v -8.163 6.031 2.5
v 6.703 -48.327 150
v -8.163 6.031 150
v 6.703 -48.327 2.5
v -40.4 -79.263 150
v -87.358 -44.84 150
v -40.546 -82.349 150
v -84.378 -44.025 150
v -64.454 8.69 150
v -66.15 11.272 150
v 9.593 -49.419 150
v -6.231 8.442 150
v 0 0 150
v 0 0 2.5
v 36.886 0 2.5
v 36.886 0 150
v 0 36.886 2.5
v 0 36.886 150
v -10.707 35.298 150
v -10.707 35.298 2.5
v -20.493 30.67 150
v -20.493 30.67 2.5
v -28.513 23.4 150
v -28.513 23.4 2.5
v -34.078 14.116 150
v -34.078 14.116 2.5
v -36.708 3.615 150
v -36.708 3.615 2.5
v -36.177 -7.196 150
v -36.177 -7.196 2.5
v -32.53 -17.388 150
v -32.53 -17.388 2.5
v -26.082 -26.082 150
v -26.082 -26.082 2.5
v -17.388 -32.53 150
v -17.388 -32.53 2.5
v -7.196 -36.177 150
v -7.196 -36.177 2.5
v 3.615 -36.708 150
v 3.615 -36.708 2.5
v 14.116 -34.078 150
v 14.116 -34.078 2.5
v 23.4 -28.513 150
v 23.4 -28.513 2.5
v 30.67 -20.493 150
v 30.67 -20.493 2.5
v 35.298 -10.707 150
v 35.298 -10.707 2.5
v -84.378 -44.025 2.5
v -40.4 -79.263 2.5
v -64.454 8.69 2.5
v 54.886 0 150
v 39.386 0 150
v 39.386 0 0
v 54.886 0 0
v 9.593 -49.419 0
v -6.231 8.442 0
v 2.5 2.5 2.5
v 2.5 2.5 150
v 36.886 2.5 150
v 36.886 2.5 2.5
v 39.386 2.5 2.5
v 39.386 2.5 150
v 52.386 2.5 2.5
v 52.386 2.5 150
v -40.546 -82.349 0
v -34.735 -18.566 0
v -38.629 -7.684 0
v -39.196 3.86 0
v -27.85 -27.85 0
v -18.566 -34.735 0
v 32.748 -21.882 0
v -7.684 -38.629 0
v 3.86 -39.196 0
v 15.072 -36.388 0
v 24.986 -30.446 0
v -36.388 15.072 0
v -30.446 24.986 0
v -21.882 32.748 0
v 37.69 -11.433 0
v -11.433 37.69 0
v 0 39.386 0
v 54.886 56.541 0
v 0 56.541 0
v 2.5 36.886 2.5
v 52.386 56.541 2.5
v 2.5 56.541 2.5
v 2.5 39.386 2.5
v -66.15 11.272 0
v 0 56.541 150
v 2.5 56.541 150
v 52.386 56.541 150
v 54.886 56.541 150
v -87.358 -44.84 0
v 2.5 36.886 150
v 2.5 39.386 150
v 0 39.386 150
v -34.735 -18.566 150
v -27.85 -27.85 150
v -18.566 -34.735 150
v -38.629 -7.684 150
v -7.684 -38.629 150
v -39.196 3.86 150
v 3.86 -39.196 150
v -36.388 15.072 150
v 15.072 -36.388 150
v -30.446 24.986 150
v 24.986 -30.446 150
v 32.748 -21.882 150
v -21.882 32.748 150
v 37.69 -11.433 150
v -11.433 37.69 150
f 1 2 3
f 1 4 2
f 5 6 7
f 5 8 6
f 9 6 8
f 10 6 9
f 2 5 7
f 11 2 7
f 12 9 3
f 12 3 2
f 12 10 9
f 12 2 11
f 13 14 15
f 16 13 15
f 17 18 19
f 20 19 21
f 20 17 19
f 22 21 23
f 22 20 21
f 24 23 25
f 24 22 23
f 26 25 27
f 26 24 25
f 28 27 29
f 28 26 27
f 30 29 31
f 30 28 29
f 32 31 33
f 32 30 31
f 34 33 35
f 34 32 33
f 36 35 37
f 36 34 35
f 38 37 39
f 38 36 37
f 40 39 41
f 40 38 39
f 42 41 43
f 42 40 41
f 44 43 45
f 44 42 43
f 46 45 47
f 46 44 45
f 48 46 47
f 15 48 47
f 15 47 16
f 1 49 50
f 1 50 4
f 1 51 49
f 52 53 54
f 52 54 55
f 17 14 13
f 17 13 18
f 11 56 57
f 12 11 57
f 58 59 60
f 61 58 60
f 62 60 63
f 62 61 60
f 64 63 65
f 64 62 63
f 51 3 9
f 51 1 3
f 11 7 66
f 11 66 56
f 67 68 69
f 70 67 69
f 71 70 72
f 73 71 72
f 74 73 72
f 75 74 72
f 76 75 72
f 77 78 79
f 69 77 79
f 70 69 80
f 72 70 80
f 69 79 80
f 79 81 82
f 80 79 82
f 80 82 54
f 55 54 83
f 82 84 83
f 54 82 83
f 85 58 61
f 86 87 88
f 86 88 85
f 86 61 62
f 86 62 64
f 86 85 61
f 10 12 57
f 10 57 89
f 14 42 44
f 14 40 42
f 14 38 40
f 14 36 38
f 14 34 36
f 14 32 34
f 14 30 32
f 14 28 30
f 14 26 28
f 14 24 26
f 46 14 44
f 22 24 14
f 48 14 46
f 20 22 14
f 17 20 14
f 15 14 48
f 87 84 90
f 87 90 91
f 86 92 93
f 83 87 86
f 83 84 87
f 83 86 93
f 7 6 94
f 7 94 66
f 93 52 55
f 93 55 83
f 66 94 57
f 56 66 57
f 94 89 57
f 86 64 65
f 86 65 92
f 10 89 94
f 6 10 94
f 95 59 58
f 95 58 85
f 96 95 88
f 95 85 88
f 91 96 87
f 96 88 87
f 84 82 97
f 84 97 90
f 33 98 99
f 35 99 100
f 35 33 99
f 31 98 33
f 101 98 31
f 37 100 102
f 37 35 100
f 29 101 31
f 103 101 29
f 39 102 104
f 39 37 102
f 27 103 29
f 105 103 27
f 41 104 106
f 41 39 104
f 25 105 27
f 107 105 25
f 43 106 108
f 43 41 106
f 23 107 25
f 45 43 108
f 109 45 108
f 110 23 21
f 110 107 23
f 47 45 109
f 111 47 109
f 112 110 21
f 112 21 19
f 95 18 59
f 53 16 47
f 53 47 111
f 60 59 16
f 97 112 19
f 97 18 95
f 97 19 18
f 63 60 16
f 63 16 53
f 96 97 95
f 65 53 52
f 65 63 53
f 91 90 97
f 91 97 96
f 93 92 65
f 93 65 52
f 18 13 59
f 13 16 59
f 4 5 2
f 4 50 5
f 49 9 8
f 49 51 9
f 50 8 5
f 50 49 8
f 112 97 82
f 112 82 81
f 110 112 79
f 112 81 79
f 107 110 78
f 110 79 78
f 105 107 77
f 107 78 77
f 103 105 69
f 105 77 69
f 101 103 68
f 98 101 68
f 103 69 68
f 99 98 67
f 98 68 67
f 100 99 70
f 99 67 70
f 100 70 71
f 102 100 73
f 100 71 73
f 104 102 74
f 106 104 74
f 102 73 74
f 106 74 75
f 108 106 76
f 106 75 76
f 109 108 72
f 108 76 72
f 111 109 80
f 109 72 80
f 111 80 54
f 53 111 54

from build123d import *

# Parameters (mm, degrees)
F0_R         = 39.3858974646
F1_DEPTH     = 150
F2_T         = -2.5
F3_W         = 54.8863634467
F3_H         = 56.5410479903
F4_DEPTH     = 150
F5_T         = 2.5
F5_T3_DEPTH  = 155
F5_T5_DEPTH  = 152.5
F5_T7_DEPTH  = 41.8858974646
F5_T9_DEPTH  = 41.8858974646
F5_T12_ANGLE = 270.000000001
F7_DEPTH     = 150
F8_T         = -2.5


# Not quite as in the source:
# - a shell that OpenCascade refuses in one call is made with other operations: the cavity is built on its own and cut out


with BuildPart() as f1:
    # F0 (on Top) → F1 (new body)
    with BuildSketch(Plane.XY):
        Circle(F0_R)
    extrude(amount=F1_DEPTH)

    # F2
    f2_openings = [f1.faces().sort_by_distance(p)[0] for p in [
        (0, 0, 150),
    ]]
    offset(amount=F2_T, openings=f2_openings)

    # F3 (on Top) → F4 (join)
    with BuildSketch(Plane.XY):
        with Locations((27.4431817234, 28.2705239952)):
            Rectangle(F3_W, F3_H)
    extrude(amount=F4_DEPTH)

    # F5: shell of thickness 2.5, made by hand


with BuildPart() as f5_core1:
    # F5_t2: copy of F1
    add(f1.part)

    # the walls: a layer under each face that stays
    f5_faces = [f5_core1.faces().sort_by_distance(p)[0] for p in [
        (7.7502329911, 8.5775752629, 0),
        (-27.8500351803, -27.8500351803, 75),
        (54.8863634467, 28.2705239952, 75),
        (47.1361304556, 0, 75),
        (0, 47.9634727274, 75),
        (-26.0822682274, -26.0822682273, 76.25),
        (18.4429487323, 0, 76.25),
        (0, 18.4429487323, 76.25),
        (-24.5905983097, -24.5905983097, 2.5),
    ]]
    thicken(f5_faces, amount=-F5_T, mode=Mode.SUBTRACT)

    # F5_s4 → F5_t3 (cut)
    with BuildSketch(Plane.XY.offset(-2.5)):
        Polygon((39.4108974646, -0.025), (36.8858974646, 0), (36.8858974646, 2.5), (39.3858974646, 2.5), align=None)
        Polygon((-0.025, 39.4108974646), (0, 36.8858974646), (2.5, 36.8858974646), (2.5, 39.3858974646), align=None)
    extrude(amount=F5_T3_DEPTH, mode=Mode.SUBTRACT)

    # F5_s6 → F5_t5 (cut)
    with BuildSketch(Plane.XY):
        Polygon((36.8608974646, -0.025), (39.3858974646, 0), (39.3858974646, 2.5), (36.8858974646, 2.5), align=None)
        Polygon((-0.025, 36.8608974646), (0, 39.3858974646), (2.5, 39.3858974646), (2.5, 36.8858974646), align=None)
    extrude(amount=F5_T5_DEPTH, mode=Mode.SUBTRACT)

    # F5_s8 → F5_t7 (cut)
    with BuildSketch(Plane.YZ.offset(-2.5)):
        Polygon((-0.025, 2.525), (2.5, 2.5), (2.5, 0), (0, 0), align=None)
    extrude(amount=F5_T7_DEPTH, mode=Mode.SUBTRACT)

    # F5_s10 → F5_t9 (cut)
    with BuildSketch(Plane.XZ.offset(-39.3858974646)):
        Polygon((-0.025, 2.525), (2.5, 2.5), (2.5, 0), (0, 0), align=None)
    extrude(amount=F5_T9_DEPTH, mode=Mode.SUBTRACT)

    # F5_s11 → F5_t12 (revolve, cut)
    with BuildSketch(Plane.XZ):
        Polygon((36.8608974646, 2.525), (39.3858974646, 2.5), (39.3858974646, 0), (36.8858974646, 0), align=None)
    revolve(axis=Axis((0, 0, 2.5), (0, 0, -1)), revolution_arc=F5_T12_ANGLE, mode=Mode.SUBTRACT)


with BuildPart() as f1_1:
    add(f1.part)

    # what is left inside the walls is the cavity
    f5_cavity = [f5_core1.part.solids().sort_by_distance(p)[0] for p in [
        (52.361363, 29.520524, 100.833333),
    ]]
    add(f5_cavity, mode=Mode.SUBTRACT)


with BuildPart() as f7:
    # F6 (on Top) → F7 (new body)
    with BuildSketch(Plane.XY):
        Polygon((-87.3583794889, -44.8397668156), (-40.5461250487, -82.3494074789), (9.5934452951, -49.4194242689), (-6.2308504914, 8.4420652671), (-66.1503734792, 11.2724492301), align=None)
    extrude(amount=F7_DEPTH)

    # F8
    f8_openings = [f7.faces().sort_by_distance(p)[0] for p in [
        (-38.138457, -31.378817, 150),
    ]]
    offset(amount=F8_T, openings=f8_openings)


solid = Compound([f1_1.part, f7.part])
